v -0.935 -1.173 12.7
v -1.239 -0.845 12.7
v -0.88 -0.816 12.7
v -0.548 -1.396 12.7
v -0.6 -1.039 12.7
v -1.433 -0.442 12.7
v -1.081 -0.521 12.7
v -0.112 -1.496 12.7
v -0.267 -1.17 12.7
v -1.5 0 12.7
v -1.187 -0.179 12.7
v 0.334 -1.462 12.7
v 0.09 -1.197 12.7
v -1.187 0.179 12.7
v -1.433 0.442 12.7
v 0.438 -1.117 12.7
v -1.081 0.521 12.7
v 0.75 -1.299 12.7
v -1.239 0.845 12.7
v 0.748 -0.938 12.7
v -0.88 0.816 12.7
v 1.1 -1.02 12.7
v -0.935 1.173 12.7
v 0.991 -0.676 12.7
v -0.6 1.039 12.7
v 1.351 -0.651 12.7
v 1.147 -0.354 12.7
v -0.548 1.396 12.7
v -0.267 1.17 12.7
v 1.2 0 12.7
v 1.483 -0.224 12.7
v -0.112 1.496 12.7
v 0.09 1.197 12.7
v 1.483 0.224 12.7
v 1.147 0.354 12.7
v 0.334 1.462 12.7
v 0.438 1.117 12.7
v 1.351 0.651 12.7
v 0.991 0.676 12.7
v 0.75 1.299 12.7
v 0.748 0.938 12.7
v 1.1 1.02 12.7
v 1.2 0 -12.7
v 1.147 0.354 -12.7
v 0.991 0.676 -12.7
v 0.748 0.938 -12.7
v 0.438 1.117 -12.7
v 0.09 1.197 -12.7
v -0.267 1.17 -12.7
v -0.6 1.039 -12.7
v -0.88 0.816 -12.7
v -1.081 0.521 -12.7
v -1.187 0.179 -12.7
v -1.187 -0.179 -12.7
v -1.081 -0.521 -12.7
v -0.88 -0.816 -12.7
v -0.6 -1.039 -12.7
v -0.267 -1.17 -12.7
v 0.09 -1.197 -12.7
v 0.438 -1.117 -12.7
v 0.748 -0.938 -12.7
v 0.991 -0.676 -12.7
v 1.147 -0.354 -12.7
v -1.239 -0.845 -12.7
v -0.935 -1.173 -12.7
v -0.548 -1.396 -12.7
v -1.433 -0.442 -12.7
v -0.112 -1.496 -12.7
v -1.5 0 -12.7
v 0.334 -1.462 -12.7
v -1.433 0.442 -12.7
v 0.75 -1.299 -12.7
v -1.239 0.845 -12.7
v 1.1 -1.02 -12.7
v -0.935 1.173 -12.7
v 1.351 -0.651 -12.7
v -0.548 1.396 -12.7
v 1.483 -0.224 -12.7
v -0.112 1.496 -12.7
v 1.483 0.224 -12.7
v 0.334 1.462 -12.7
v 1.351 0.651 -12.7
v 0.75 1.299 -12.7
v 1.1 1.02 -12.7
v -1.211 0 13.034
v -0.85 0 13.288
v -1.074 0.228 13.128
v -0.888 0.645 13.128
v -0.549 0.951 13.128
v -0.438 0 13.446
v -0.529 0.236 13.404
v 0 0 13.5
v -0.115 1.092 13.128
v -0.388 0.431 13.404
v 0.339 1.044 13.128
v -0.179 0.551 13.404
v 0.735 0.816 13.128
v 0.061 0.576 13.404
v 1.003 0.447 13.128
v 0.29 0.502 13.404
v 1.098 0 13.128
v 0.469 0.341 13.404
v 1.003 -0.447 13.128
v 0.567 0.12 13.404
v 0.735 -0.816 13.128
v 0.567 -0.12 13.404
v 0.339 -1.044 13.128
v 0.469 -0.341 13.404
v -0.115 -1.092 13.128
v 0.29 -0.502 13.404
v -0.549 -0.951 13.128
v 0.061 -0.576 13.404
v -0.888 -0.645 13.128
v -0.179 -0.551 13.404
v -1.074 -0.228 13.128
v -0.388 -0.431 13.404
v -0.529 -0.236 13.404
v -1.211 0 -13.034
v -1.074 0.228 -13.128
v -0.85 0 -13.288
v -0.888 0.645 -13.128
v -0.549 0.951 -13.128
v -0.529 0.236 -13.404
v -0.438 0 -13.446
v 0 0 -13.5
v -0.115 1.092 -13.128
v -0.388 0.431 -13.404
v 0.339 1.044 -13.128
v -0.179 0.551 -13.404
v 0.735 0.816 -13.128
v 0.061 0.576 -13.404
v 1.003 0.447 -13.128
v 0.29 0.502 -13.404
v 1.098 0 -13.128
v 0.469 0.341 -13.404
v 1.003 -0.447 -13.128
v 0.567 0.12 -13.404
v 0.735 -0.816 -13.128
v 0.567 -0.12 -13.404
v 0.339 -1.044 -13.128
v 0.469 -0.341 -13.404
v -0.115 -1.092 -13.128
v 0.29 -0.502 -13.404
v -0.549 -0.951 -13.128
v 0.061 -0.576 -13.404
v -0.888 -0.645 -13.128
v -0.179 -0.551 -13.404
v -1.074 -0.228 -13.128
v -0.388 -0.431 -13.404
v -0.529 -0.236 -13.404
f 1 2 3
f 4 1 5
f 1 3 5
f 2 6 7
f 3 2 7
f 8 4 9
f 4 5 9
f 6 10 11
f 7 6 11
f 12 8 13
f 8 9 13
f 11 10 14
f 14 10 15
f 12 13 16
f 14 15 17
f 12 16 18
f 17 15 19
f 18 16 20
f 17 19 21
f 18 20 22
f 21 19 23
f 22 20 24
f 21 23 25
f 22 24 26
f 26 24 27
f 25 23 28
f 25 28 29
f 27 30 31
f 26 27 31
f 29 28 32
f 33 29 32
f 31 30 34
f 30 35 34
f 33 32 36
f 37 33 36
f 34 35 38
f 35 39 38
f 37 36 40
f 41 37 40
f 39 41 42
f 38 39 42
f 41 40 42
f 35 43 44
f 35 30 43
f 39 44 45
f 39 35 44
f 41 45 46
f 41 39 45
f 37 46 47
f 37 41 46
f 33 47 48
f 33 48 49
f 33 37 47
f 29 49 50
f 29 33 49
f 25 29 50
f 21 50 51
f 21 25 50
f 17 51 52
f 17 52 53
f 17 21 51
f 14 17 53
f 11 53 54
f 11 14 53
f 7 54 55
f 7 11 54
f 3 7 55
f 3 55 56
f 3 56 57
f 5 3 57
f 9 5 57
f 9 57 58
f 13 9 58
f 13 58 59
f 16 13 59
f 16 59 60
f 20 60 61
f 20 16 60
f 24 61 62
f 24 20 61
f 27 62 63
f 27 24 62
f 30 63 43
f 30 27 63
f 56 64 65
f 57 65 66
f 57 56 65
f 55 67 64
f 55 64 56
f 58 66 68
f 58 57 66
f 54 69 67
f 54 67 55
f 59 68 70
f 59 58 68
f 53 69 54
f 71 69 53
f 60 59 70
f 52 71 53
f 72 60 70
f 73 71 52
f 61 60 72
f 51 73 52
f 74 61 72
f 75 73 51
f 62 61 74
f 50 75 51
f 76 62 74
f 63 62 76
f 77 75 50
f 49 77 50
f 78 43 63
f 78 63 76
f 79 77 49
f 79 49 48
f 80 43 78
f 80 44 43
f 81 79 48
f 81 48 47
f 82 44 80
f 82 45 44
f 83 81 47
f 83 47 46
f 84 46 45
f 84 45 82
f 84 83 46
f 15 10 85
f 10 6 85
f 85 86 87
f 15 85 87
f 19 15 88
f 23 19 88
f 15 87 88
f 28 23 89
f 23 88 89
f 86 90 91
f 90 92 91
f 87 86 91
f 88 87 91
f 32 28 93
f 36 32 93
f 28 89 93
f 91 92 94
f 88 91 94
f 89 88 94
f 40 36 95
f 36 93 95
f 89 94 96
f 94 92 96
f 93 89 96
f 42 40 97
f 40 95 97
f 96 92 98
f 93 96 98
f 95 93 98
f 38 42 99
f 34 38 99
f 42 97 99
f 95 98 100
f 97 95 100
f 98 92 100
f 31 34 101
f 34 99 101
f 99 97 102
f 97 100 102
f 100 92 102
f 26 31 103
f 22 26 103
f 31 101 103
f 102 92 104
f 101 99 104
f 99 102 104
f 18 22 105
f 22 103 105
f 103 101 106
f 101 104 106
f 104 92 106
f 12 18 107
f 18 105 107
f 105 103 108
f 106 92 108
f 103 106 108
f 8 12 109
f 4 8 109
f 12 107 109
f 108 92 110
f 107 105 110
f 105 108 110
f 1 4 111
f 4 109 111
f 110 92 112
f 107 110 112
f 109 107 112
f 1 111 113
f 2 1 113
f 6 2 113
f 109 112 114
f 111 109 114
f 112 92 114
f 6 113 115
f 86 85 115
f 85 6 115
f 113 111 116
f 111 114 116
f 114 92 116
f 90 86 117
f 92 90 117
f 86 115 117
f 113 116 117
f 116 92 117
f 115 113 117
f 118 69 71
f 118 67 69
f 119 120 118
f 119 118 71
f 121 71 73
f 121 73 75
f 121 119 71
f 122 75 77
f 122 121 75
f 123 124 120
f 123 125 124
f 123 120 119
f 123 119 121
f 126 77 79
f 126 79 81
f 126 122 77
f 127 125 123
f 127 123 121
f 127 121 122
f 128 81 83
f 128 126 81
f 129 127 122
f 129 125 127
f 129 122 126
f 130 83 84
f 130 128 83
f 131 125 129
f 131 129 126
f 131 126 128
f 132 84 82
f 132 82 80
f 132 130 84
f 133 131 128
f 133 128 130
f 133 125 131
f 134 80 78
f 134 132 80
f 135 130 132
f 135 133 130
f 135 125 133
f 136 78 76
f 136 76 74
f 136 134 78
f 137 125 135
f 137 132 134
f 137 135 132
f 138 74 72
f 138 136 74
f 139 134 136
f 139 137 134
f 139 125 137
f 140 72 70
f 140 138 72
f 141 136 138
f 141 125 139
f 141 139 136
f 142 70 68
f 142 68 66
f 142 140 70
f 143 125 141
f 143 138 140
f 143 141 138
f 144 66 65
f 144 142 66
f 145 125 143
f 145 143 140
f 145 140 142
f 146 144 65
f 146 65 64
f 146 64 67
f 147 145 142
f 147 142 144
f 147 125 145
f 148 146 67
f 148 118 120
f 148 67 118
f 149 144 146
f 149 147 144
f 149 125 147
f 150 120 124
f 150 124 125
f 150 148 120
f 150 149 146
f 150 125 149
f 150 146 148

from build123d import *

# Parameters (mm, degrees)
CROQUIS1_R              = 1.2
SALIENTE_EXTRUIR1_DEPTH = 12.7


with BuildPart() as part:
    # Croquis1 → Saliente-Extruir1 (new, symmetric)
    with BuildSketch(Plane.XY):
        Circle(CROQUIS1_R)
    extrude(amount=SALIENTE_EXTRUIR1_DEPTH, both=True)

    # Croquis4 → Revolución1 (revolve)
    with BuildSketch(Plane(origin=(0, 0, 0), x_dir=(1, 0, 0), z_dir=(0, 1, 0))):
        with BuildLine():
            Line((0, -13.5), (0, -12.7))
            Line((0, -12.7), (-1.5, -12.7))
            ThreePointArc((-1.5, -12.7), (-0.85, -13.2875), (0, -13.5))
        make_face()
    revoluci_n1 = revolve(axis=Axis((0, 0, 13.5), (0, 0, -1)))

    # Simetría1: Revolución1 across plane
    add(revoluci_n1.mirror(Plane.XY))


solid = part.part
